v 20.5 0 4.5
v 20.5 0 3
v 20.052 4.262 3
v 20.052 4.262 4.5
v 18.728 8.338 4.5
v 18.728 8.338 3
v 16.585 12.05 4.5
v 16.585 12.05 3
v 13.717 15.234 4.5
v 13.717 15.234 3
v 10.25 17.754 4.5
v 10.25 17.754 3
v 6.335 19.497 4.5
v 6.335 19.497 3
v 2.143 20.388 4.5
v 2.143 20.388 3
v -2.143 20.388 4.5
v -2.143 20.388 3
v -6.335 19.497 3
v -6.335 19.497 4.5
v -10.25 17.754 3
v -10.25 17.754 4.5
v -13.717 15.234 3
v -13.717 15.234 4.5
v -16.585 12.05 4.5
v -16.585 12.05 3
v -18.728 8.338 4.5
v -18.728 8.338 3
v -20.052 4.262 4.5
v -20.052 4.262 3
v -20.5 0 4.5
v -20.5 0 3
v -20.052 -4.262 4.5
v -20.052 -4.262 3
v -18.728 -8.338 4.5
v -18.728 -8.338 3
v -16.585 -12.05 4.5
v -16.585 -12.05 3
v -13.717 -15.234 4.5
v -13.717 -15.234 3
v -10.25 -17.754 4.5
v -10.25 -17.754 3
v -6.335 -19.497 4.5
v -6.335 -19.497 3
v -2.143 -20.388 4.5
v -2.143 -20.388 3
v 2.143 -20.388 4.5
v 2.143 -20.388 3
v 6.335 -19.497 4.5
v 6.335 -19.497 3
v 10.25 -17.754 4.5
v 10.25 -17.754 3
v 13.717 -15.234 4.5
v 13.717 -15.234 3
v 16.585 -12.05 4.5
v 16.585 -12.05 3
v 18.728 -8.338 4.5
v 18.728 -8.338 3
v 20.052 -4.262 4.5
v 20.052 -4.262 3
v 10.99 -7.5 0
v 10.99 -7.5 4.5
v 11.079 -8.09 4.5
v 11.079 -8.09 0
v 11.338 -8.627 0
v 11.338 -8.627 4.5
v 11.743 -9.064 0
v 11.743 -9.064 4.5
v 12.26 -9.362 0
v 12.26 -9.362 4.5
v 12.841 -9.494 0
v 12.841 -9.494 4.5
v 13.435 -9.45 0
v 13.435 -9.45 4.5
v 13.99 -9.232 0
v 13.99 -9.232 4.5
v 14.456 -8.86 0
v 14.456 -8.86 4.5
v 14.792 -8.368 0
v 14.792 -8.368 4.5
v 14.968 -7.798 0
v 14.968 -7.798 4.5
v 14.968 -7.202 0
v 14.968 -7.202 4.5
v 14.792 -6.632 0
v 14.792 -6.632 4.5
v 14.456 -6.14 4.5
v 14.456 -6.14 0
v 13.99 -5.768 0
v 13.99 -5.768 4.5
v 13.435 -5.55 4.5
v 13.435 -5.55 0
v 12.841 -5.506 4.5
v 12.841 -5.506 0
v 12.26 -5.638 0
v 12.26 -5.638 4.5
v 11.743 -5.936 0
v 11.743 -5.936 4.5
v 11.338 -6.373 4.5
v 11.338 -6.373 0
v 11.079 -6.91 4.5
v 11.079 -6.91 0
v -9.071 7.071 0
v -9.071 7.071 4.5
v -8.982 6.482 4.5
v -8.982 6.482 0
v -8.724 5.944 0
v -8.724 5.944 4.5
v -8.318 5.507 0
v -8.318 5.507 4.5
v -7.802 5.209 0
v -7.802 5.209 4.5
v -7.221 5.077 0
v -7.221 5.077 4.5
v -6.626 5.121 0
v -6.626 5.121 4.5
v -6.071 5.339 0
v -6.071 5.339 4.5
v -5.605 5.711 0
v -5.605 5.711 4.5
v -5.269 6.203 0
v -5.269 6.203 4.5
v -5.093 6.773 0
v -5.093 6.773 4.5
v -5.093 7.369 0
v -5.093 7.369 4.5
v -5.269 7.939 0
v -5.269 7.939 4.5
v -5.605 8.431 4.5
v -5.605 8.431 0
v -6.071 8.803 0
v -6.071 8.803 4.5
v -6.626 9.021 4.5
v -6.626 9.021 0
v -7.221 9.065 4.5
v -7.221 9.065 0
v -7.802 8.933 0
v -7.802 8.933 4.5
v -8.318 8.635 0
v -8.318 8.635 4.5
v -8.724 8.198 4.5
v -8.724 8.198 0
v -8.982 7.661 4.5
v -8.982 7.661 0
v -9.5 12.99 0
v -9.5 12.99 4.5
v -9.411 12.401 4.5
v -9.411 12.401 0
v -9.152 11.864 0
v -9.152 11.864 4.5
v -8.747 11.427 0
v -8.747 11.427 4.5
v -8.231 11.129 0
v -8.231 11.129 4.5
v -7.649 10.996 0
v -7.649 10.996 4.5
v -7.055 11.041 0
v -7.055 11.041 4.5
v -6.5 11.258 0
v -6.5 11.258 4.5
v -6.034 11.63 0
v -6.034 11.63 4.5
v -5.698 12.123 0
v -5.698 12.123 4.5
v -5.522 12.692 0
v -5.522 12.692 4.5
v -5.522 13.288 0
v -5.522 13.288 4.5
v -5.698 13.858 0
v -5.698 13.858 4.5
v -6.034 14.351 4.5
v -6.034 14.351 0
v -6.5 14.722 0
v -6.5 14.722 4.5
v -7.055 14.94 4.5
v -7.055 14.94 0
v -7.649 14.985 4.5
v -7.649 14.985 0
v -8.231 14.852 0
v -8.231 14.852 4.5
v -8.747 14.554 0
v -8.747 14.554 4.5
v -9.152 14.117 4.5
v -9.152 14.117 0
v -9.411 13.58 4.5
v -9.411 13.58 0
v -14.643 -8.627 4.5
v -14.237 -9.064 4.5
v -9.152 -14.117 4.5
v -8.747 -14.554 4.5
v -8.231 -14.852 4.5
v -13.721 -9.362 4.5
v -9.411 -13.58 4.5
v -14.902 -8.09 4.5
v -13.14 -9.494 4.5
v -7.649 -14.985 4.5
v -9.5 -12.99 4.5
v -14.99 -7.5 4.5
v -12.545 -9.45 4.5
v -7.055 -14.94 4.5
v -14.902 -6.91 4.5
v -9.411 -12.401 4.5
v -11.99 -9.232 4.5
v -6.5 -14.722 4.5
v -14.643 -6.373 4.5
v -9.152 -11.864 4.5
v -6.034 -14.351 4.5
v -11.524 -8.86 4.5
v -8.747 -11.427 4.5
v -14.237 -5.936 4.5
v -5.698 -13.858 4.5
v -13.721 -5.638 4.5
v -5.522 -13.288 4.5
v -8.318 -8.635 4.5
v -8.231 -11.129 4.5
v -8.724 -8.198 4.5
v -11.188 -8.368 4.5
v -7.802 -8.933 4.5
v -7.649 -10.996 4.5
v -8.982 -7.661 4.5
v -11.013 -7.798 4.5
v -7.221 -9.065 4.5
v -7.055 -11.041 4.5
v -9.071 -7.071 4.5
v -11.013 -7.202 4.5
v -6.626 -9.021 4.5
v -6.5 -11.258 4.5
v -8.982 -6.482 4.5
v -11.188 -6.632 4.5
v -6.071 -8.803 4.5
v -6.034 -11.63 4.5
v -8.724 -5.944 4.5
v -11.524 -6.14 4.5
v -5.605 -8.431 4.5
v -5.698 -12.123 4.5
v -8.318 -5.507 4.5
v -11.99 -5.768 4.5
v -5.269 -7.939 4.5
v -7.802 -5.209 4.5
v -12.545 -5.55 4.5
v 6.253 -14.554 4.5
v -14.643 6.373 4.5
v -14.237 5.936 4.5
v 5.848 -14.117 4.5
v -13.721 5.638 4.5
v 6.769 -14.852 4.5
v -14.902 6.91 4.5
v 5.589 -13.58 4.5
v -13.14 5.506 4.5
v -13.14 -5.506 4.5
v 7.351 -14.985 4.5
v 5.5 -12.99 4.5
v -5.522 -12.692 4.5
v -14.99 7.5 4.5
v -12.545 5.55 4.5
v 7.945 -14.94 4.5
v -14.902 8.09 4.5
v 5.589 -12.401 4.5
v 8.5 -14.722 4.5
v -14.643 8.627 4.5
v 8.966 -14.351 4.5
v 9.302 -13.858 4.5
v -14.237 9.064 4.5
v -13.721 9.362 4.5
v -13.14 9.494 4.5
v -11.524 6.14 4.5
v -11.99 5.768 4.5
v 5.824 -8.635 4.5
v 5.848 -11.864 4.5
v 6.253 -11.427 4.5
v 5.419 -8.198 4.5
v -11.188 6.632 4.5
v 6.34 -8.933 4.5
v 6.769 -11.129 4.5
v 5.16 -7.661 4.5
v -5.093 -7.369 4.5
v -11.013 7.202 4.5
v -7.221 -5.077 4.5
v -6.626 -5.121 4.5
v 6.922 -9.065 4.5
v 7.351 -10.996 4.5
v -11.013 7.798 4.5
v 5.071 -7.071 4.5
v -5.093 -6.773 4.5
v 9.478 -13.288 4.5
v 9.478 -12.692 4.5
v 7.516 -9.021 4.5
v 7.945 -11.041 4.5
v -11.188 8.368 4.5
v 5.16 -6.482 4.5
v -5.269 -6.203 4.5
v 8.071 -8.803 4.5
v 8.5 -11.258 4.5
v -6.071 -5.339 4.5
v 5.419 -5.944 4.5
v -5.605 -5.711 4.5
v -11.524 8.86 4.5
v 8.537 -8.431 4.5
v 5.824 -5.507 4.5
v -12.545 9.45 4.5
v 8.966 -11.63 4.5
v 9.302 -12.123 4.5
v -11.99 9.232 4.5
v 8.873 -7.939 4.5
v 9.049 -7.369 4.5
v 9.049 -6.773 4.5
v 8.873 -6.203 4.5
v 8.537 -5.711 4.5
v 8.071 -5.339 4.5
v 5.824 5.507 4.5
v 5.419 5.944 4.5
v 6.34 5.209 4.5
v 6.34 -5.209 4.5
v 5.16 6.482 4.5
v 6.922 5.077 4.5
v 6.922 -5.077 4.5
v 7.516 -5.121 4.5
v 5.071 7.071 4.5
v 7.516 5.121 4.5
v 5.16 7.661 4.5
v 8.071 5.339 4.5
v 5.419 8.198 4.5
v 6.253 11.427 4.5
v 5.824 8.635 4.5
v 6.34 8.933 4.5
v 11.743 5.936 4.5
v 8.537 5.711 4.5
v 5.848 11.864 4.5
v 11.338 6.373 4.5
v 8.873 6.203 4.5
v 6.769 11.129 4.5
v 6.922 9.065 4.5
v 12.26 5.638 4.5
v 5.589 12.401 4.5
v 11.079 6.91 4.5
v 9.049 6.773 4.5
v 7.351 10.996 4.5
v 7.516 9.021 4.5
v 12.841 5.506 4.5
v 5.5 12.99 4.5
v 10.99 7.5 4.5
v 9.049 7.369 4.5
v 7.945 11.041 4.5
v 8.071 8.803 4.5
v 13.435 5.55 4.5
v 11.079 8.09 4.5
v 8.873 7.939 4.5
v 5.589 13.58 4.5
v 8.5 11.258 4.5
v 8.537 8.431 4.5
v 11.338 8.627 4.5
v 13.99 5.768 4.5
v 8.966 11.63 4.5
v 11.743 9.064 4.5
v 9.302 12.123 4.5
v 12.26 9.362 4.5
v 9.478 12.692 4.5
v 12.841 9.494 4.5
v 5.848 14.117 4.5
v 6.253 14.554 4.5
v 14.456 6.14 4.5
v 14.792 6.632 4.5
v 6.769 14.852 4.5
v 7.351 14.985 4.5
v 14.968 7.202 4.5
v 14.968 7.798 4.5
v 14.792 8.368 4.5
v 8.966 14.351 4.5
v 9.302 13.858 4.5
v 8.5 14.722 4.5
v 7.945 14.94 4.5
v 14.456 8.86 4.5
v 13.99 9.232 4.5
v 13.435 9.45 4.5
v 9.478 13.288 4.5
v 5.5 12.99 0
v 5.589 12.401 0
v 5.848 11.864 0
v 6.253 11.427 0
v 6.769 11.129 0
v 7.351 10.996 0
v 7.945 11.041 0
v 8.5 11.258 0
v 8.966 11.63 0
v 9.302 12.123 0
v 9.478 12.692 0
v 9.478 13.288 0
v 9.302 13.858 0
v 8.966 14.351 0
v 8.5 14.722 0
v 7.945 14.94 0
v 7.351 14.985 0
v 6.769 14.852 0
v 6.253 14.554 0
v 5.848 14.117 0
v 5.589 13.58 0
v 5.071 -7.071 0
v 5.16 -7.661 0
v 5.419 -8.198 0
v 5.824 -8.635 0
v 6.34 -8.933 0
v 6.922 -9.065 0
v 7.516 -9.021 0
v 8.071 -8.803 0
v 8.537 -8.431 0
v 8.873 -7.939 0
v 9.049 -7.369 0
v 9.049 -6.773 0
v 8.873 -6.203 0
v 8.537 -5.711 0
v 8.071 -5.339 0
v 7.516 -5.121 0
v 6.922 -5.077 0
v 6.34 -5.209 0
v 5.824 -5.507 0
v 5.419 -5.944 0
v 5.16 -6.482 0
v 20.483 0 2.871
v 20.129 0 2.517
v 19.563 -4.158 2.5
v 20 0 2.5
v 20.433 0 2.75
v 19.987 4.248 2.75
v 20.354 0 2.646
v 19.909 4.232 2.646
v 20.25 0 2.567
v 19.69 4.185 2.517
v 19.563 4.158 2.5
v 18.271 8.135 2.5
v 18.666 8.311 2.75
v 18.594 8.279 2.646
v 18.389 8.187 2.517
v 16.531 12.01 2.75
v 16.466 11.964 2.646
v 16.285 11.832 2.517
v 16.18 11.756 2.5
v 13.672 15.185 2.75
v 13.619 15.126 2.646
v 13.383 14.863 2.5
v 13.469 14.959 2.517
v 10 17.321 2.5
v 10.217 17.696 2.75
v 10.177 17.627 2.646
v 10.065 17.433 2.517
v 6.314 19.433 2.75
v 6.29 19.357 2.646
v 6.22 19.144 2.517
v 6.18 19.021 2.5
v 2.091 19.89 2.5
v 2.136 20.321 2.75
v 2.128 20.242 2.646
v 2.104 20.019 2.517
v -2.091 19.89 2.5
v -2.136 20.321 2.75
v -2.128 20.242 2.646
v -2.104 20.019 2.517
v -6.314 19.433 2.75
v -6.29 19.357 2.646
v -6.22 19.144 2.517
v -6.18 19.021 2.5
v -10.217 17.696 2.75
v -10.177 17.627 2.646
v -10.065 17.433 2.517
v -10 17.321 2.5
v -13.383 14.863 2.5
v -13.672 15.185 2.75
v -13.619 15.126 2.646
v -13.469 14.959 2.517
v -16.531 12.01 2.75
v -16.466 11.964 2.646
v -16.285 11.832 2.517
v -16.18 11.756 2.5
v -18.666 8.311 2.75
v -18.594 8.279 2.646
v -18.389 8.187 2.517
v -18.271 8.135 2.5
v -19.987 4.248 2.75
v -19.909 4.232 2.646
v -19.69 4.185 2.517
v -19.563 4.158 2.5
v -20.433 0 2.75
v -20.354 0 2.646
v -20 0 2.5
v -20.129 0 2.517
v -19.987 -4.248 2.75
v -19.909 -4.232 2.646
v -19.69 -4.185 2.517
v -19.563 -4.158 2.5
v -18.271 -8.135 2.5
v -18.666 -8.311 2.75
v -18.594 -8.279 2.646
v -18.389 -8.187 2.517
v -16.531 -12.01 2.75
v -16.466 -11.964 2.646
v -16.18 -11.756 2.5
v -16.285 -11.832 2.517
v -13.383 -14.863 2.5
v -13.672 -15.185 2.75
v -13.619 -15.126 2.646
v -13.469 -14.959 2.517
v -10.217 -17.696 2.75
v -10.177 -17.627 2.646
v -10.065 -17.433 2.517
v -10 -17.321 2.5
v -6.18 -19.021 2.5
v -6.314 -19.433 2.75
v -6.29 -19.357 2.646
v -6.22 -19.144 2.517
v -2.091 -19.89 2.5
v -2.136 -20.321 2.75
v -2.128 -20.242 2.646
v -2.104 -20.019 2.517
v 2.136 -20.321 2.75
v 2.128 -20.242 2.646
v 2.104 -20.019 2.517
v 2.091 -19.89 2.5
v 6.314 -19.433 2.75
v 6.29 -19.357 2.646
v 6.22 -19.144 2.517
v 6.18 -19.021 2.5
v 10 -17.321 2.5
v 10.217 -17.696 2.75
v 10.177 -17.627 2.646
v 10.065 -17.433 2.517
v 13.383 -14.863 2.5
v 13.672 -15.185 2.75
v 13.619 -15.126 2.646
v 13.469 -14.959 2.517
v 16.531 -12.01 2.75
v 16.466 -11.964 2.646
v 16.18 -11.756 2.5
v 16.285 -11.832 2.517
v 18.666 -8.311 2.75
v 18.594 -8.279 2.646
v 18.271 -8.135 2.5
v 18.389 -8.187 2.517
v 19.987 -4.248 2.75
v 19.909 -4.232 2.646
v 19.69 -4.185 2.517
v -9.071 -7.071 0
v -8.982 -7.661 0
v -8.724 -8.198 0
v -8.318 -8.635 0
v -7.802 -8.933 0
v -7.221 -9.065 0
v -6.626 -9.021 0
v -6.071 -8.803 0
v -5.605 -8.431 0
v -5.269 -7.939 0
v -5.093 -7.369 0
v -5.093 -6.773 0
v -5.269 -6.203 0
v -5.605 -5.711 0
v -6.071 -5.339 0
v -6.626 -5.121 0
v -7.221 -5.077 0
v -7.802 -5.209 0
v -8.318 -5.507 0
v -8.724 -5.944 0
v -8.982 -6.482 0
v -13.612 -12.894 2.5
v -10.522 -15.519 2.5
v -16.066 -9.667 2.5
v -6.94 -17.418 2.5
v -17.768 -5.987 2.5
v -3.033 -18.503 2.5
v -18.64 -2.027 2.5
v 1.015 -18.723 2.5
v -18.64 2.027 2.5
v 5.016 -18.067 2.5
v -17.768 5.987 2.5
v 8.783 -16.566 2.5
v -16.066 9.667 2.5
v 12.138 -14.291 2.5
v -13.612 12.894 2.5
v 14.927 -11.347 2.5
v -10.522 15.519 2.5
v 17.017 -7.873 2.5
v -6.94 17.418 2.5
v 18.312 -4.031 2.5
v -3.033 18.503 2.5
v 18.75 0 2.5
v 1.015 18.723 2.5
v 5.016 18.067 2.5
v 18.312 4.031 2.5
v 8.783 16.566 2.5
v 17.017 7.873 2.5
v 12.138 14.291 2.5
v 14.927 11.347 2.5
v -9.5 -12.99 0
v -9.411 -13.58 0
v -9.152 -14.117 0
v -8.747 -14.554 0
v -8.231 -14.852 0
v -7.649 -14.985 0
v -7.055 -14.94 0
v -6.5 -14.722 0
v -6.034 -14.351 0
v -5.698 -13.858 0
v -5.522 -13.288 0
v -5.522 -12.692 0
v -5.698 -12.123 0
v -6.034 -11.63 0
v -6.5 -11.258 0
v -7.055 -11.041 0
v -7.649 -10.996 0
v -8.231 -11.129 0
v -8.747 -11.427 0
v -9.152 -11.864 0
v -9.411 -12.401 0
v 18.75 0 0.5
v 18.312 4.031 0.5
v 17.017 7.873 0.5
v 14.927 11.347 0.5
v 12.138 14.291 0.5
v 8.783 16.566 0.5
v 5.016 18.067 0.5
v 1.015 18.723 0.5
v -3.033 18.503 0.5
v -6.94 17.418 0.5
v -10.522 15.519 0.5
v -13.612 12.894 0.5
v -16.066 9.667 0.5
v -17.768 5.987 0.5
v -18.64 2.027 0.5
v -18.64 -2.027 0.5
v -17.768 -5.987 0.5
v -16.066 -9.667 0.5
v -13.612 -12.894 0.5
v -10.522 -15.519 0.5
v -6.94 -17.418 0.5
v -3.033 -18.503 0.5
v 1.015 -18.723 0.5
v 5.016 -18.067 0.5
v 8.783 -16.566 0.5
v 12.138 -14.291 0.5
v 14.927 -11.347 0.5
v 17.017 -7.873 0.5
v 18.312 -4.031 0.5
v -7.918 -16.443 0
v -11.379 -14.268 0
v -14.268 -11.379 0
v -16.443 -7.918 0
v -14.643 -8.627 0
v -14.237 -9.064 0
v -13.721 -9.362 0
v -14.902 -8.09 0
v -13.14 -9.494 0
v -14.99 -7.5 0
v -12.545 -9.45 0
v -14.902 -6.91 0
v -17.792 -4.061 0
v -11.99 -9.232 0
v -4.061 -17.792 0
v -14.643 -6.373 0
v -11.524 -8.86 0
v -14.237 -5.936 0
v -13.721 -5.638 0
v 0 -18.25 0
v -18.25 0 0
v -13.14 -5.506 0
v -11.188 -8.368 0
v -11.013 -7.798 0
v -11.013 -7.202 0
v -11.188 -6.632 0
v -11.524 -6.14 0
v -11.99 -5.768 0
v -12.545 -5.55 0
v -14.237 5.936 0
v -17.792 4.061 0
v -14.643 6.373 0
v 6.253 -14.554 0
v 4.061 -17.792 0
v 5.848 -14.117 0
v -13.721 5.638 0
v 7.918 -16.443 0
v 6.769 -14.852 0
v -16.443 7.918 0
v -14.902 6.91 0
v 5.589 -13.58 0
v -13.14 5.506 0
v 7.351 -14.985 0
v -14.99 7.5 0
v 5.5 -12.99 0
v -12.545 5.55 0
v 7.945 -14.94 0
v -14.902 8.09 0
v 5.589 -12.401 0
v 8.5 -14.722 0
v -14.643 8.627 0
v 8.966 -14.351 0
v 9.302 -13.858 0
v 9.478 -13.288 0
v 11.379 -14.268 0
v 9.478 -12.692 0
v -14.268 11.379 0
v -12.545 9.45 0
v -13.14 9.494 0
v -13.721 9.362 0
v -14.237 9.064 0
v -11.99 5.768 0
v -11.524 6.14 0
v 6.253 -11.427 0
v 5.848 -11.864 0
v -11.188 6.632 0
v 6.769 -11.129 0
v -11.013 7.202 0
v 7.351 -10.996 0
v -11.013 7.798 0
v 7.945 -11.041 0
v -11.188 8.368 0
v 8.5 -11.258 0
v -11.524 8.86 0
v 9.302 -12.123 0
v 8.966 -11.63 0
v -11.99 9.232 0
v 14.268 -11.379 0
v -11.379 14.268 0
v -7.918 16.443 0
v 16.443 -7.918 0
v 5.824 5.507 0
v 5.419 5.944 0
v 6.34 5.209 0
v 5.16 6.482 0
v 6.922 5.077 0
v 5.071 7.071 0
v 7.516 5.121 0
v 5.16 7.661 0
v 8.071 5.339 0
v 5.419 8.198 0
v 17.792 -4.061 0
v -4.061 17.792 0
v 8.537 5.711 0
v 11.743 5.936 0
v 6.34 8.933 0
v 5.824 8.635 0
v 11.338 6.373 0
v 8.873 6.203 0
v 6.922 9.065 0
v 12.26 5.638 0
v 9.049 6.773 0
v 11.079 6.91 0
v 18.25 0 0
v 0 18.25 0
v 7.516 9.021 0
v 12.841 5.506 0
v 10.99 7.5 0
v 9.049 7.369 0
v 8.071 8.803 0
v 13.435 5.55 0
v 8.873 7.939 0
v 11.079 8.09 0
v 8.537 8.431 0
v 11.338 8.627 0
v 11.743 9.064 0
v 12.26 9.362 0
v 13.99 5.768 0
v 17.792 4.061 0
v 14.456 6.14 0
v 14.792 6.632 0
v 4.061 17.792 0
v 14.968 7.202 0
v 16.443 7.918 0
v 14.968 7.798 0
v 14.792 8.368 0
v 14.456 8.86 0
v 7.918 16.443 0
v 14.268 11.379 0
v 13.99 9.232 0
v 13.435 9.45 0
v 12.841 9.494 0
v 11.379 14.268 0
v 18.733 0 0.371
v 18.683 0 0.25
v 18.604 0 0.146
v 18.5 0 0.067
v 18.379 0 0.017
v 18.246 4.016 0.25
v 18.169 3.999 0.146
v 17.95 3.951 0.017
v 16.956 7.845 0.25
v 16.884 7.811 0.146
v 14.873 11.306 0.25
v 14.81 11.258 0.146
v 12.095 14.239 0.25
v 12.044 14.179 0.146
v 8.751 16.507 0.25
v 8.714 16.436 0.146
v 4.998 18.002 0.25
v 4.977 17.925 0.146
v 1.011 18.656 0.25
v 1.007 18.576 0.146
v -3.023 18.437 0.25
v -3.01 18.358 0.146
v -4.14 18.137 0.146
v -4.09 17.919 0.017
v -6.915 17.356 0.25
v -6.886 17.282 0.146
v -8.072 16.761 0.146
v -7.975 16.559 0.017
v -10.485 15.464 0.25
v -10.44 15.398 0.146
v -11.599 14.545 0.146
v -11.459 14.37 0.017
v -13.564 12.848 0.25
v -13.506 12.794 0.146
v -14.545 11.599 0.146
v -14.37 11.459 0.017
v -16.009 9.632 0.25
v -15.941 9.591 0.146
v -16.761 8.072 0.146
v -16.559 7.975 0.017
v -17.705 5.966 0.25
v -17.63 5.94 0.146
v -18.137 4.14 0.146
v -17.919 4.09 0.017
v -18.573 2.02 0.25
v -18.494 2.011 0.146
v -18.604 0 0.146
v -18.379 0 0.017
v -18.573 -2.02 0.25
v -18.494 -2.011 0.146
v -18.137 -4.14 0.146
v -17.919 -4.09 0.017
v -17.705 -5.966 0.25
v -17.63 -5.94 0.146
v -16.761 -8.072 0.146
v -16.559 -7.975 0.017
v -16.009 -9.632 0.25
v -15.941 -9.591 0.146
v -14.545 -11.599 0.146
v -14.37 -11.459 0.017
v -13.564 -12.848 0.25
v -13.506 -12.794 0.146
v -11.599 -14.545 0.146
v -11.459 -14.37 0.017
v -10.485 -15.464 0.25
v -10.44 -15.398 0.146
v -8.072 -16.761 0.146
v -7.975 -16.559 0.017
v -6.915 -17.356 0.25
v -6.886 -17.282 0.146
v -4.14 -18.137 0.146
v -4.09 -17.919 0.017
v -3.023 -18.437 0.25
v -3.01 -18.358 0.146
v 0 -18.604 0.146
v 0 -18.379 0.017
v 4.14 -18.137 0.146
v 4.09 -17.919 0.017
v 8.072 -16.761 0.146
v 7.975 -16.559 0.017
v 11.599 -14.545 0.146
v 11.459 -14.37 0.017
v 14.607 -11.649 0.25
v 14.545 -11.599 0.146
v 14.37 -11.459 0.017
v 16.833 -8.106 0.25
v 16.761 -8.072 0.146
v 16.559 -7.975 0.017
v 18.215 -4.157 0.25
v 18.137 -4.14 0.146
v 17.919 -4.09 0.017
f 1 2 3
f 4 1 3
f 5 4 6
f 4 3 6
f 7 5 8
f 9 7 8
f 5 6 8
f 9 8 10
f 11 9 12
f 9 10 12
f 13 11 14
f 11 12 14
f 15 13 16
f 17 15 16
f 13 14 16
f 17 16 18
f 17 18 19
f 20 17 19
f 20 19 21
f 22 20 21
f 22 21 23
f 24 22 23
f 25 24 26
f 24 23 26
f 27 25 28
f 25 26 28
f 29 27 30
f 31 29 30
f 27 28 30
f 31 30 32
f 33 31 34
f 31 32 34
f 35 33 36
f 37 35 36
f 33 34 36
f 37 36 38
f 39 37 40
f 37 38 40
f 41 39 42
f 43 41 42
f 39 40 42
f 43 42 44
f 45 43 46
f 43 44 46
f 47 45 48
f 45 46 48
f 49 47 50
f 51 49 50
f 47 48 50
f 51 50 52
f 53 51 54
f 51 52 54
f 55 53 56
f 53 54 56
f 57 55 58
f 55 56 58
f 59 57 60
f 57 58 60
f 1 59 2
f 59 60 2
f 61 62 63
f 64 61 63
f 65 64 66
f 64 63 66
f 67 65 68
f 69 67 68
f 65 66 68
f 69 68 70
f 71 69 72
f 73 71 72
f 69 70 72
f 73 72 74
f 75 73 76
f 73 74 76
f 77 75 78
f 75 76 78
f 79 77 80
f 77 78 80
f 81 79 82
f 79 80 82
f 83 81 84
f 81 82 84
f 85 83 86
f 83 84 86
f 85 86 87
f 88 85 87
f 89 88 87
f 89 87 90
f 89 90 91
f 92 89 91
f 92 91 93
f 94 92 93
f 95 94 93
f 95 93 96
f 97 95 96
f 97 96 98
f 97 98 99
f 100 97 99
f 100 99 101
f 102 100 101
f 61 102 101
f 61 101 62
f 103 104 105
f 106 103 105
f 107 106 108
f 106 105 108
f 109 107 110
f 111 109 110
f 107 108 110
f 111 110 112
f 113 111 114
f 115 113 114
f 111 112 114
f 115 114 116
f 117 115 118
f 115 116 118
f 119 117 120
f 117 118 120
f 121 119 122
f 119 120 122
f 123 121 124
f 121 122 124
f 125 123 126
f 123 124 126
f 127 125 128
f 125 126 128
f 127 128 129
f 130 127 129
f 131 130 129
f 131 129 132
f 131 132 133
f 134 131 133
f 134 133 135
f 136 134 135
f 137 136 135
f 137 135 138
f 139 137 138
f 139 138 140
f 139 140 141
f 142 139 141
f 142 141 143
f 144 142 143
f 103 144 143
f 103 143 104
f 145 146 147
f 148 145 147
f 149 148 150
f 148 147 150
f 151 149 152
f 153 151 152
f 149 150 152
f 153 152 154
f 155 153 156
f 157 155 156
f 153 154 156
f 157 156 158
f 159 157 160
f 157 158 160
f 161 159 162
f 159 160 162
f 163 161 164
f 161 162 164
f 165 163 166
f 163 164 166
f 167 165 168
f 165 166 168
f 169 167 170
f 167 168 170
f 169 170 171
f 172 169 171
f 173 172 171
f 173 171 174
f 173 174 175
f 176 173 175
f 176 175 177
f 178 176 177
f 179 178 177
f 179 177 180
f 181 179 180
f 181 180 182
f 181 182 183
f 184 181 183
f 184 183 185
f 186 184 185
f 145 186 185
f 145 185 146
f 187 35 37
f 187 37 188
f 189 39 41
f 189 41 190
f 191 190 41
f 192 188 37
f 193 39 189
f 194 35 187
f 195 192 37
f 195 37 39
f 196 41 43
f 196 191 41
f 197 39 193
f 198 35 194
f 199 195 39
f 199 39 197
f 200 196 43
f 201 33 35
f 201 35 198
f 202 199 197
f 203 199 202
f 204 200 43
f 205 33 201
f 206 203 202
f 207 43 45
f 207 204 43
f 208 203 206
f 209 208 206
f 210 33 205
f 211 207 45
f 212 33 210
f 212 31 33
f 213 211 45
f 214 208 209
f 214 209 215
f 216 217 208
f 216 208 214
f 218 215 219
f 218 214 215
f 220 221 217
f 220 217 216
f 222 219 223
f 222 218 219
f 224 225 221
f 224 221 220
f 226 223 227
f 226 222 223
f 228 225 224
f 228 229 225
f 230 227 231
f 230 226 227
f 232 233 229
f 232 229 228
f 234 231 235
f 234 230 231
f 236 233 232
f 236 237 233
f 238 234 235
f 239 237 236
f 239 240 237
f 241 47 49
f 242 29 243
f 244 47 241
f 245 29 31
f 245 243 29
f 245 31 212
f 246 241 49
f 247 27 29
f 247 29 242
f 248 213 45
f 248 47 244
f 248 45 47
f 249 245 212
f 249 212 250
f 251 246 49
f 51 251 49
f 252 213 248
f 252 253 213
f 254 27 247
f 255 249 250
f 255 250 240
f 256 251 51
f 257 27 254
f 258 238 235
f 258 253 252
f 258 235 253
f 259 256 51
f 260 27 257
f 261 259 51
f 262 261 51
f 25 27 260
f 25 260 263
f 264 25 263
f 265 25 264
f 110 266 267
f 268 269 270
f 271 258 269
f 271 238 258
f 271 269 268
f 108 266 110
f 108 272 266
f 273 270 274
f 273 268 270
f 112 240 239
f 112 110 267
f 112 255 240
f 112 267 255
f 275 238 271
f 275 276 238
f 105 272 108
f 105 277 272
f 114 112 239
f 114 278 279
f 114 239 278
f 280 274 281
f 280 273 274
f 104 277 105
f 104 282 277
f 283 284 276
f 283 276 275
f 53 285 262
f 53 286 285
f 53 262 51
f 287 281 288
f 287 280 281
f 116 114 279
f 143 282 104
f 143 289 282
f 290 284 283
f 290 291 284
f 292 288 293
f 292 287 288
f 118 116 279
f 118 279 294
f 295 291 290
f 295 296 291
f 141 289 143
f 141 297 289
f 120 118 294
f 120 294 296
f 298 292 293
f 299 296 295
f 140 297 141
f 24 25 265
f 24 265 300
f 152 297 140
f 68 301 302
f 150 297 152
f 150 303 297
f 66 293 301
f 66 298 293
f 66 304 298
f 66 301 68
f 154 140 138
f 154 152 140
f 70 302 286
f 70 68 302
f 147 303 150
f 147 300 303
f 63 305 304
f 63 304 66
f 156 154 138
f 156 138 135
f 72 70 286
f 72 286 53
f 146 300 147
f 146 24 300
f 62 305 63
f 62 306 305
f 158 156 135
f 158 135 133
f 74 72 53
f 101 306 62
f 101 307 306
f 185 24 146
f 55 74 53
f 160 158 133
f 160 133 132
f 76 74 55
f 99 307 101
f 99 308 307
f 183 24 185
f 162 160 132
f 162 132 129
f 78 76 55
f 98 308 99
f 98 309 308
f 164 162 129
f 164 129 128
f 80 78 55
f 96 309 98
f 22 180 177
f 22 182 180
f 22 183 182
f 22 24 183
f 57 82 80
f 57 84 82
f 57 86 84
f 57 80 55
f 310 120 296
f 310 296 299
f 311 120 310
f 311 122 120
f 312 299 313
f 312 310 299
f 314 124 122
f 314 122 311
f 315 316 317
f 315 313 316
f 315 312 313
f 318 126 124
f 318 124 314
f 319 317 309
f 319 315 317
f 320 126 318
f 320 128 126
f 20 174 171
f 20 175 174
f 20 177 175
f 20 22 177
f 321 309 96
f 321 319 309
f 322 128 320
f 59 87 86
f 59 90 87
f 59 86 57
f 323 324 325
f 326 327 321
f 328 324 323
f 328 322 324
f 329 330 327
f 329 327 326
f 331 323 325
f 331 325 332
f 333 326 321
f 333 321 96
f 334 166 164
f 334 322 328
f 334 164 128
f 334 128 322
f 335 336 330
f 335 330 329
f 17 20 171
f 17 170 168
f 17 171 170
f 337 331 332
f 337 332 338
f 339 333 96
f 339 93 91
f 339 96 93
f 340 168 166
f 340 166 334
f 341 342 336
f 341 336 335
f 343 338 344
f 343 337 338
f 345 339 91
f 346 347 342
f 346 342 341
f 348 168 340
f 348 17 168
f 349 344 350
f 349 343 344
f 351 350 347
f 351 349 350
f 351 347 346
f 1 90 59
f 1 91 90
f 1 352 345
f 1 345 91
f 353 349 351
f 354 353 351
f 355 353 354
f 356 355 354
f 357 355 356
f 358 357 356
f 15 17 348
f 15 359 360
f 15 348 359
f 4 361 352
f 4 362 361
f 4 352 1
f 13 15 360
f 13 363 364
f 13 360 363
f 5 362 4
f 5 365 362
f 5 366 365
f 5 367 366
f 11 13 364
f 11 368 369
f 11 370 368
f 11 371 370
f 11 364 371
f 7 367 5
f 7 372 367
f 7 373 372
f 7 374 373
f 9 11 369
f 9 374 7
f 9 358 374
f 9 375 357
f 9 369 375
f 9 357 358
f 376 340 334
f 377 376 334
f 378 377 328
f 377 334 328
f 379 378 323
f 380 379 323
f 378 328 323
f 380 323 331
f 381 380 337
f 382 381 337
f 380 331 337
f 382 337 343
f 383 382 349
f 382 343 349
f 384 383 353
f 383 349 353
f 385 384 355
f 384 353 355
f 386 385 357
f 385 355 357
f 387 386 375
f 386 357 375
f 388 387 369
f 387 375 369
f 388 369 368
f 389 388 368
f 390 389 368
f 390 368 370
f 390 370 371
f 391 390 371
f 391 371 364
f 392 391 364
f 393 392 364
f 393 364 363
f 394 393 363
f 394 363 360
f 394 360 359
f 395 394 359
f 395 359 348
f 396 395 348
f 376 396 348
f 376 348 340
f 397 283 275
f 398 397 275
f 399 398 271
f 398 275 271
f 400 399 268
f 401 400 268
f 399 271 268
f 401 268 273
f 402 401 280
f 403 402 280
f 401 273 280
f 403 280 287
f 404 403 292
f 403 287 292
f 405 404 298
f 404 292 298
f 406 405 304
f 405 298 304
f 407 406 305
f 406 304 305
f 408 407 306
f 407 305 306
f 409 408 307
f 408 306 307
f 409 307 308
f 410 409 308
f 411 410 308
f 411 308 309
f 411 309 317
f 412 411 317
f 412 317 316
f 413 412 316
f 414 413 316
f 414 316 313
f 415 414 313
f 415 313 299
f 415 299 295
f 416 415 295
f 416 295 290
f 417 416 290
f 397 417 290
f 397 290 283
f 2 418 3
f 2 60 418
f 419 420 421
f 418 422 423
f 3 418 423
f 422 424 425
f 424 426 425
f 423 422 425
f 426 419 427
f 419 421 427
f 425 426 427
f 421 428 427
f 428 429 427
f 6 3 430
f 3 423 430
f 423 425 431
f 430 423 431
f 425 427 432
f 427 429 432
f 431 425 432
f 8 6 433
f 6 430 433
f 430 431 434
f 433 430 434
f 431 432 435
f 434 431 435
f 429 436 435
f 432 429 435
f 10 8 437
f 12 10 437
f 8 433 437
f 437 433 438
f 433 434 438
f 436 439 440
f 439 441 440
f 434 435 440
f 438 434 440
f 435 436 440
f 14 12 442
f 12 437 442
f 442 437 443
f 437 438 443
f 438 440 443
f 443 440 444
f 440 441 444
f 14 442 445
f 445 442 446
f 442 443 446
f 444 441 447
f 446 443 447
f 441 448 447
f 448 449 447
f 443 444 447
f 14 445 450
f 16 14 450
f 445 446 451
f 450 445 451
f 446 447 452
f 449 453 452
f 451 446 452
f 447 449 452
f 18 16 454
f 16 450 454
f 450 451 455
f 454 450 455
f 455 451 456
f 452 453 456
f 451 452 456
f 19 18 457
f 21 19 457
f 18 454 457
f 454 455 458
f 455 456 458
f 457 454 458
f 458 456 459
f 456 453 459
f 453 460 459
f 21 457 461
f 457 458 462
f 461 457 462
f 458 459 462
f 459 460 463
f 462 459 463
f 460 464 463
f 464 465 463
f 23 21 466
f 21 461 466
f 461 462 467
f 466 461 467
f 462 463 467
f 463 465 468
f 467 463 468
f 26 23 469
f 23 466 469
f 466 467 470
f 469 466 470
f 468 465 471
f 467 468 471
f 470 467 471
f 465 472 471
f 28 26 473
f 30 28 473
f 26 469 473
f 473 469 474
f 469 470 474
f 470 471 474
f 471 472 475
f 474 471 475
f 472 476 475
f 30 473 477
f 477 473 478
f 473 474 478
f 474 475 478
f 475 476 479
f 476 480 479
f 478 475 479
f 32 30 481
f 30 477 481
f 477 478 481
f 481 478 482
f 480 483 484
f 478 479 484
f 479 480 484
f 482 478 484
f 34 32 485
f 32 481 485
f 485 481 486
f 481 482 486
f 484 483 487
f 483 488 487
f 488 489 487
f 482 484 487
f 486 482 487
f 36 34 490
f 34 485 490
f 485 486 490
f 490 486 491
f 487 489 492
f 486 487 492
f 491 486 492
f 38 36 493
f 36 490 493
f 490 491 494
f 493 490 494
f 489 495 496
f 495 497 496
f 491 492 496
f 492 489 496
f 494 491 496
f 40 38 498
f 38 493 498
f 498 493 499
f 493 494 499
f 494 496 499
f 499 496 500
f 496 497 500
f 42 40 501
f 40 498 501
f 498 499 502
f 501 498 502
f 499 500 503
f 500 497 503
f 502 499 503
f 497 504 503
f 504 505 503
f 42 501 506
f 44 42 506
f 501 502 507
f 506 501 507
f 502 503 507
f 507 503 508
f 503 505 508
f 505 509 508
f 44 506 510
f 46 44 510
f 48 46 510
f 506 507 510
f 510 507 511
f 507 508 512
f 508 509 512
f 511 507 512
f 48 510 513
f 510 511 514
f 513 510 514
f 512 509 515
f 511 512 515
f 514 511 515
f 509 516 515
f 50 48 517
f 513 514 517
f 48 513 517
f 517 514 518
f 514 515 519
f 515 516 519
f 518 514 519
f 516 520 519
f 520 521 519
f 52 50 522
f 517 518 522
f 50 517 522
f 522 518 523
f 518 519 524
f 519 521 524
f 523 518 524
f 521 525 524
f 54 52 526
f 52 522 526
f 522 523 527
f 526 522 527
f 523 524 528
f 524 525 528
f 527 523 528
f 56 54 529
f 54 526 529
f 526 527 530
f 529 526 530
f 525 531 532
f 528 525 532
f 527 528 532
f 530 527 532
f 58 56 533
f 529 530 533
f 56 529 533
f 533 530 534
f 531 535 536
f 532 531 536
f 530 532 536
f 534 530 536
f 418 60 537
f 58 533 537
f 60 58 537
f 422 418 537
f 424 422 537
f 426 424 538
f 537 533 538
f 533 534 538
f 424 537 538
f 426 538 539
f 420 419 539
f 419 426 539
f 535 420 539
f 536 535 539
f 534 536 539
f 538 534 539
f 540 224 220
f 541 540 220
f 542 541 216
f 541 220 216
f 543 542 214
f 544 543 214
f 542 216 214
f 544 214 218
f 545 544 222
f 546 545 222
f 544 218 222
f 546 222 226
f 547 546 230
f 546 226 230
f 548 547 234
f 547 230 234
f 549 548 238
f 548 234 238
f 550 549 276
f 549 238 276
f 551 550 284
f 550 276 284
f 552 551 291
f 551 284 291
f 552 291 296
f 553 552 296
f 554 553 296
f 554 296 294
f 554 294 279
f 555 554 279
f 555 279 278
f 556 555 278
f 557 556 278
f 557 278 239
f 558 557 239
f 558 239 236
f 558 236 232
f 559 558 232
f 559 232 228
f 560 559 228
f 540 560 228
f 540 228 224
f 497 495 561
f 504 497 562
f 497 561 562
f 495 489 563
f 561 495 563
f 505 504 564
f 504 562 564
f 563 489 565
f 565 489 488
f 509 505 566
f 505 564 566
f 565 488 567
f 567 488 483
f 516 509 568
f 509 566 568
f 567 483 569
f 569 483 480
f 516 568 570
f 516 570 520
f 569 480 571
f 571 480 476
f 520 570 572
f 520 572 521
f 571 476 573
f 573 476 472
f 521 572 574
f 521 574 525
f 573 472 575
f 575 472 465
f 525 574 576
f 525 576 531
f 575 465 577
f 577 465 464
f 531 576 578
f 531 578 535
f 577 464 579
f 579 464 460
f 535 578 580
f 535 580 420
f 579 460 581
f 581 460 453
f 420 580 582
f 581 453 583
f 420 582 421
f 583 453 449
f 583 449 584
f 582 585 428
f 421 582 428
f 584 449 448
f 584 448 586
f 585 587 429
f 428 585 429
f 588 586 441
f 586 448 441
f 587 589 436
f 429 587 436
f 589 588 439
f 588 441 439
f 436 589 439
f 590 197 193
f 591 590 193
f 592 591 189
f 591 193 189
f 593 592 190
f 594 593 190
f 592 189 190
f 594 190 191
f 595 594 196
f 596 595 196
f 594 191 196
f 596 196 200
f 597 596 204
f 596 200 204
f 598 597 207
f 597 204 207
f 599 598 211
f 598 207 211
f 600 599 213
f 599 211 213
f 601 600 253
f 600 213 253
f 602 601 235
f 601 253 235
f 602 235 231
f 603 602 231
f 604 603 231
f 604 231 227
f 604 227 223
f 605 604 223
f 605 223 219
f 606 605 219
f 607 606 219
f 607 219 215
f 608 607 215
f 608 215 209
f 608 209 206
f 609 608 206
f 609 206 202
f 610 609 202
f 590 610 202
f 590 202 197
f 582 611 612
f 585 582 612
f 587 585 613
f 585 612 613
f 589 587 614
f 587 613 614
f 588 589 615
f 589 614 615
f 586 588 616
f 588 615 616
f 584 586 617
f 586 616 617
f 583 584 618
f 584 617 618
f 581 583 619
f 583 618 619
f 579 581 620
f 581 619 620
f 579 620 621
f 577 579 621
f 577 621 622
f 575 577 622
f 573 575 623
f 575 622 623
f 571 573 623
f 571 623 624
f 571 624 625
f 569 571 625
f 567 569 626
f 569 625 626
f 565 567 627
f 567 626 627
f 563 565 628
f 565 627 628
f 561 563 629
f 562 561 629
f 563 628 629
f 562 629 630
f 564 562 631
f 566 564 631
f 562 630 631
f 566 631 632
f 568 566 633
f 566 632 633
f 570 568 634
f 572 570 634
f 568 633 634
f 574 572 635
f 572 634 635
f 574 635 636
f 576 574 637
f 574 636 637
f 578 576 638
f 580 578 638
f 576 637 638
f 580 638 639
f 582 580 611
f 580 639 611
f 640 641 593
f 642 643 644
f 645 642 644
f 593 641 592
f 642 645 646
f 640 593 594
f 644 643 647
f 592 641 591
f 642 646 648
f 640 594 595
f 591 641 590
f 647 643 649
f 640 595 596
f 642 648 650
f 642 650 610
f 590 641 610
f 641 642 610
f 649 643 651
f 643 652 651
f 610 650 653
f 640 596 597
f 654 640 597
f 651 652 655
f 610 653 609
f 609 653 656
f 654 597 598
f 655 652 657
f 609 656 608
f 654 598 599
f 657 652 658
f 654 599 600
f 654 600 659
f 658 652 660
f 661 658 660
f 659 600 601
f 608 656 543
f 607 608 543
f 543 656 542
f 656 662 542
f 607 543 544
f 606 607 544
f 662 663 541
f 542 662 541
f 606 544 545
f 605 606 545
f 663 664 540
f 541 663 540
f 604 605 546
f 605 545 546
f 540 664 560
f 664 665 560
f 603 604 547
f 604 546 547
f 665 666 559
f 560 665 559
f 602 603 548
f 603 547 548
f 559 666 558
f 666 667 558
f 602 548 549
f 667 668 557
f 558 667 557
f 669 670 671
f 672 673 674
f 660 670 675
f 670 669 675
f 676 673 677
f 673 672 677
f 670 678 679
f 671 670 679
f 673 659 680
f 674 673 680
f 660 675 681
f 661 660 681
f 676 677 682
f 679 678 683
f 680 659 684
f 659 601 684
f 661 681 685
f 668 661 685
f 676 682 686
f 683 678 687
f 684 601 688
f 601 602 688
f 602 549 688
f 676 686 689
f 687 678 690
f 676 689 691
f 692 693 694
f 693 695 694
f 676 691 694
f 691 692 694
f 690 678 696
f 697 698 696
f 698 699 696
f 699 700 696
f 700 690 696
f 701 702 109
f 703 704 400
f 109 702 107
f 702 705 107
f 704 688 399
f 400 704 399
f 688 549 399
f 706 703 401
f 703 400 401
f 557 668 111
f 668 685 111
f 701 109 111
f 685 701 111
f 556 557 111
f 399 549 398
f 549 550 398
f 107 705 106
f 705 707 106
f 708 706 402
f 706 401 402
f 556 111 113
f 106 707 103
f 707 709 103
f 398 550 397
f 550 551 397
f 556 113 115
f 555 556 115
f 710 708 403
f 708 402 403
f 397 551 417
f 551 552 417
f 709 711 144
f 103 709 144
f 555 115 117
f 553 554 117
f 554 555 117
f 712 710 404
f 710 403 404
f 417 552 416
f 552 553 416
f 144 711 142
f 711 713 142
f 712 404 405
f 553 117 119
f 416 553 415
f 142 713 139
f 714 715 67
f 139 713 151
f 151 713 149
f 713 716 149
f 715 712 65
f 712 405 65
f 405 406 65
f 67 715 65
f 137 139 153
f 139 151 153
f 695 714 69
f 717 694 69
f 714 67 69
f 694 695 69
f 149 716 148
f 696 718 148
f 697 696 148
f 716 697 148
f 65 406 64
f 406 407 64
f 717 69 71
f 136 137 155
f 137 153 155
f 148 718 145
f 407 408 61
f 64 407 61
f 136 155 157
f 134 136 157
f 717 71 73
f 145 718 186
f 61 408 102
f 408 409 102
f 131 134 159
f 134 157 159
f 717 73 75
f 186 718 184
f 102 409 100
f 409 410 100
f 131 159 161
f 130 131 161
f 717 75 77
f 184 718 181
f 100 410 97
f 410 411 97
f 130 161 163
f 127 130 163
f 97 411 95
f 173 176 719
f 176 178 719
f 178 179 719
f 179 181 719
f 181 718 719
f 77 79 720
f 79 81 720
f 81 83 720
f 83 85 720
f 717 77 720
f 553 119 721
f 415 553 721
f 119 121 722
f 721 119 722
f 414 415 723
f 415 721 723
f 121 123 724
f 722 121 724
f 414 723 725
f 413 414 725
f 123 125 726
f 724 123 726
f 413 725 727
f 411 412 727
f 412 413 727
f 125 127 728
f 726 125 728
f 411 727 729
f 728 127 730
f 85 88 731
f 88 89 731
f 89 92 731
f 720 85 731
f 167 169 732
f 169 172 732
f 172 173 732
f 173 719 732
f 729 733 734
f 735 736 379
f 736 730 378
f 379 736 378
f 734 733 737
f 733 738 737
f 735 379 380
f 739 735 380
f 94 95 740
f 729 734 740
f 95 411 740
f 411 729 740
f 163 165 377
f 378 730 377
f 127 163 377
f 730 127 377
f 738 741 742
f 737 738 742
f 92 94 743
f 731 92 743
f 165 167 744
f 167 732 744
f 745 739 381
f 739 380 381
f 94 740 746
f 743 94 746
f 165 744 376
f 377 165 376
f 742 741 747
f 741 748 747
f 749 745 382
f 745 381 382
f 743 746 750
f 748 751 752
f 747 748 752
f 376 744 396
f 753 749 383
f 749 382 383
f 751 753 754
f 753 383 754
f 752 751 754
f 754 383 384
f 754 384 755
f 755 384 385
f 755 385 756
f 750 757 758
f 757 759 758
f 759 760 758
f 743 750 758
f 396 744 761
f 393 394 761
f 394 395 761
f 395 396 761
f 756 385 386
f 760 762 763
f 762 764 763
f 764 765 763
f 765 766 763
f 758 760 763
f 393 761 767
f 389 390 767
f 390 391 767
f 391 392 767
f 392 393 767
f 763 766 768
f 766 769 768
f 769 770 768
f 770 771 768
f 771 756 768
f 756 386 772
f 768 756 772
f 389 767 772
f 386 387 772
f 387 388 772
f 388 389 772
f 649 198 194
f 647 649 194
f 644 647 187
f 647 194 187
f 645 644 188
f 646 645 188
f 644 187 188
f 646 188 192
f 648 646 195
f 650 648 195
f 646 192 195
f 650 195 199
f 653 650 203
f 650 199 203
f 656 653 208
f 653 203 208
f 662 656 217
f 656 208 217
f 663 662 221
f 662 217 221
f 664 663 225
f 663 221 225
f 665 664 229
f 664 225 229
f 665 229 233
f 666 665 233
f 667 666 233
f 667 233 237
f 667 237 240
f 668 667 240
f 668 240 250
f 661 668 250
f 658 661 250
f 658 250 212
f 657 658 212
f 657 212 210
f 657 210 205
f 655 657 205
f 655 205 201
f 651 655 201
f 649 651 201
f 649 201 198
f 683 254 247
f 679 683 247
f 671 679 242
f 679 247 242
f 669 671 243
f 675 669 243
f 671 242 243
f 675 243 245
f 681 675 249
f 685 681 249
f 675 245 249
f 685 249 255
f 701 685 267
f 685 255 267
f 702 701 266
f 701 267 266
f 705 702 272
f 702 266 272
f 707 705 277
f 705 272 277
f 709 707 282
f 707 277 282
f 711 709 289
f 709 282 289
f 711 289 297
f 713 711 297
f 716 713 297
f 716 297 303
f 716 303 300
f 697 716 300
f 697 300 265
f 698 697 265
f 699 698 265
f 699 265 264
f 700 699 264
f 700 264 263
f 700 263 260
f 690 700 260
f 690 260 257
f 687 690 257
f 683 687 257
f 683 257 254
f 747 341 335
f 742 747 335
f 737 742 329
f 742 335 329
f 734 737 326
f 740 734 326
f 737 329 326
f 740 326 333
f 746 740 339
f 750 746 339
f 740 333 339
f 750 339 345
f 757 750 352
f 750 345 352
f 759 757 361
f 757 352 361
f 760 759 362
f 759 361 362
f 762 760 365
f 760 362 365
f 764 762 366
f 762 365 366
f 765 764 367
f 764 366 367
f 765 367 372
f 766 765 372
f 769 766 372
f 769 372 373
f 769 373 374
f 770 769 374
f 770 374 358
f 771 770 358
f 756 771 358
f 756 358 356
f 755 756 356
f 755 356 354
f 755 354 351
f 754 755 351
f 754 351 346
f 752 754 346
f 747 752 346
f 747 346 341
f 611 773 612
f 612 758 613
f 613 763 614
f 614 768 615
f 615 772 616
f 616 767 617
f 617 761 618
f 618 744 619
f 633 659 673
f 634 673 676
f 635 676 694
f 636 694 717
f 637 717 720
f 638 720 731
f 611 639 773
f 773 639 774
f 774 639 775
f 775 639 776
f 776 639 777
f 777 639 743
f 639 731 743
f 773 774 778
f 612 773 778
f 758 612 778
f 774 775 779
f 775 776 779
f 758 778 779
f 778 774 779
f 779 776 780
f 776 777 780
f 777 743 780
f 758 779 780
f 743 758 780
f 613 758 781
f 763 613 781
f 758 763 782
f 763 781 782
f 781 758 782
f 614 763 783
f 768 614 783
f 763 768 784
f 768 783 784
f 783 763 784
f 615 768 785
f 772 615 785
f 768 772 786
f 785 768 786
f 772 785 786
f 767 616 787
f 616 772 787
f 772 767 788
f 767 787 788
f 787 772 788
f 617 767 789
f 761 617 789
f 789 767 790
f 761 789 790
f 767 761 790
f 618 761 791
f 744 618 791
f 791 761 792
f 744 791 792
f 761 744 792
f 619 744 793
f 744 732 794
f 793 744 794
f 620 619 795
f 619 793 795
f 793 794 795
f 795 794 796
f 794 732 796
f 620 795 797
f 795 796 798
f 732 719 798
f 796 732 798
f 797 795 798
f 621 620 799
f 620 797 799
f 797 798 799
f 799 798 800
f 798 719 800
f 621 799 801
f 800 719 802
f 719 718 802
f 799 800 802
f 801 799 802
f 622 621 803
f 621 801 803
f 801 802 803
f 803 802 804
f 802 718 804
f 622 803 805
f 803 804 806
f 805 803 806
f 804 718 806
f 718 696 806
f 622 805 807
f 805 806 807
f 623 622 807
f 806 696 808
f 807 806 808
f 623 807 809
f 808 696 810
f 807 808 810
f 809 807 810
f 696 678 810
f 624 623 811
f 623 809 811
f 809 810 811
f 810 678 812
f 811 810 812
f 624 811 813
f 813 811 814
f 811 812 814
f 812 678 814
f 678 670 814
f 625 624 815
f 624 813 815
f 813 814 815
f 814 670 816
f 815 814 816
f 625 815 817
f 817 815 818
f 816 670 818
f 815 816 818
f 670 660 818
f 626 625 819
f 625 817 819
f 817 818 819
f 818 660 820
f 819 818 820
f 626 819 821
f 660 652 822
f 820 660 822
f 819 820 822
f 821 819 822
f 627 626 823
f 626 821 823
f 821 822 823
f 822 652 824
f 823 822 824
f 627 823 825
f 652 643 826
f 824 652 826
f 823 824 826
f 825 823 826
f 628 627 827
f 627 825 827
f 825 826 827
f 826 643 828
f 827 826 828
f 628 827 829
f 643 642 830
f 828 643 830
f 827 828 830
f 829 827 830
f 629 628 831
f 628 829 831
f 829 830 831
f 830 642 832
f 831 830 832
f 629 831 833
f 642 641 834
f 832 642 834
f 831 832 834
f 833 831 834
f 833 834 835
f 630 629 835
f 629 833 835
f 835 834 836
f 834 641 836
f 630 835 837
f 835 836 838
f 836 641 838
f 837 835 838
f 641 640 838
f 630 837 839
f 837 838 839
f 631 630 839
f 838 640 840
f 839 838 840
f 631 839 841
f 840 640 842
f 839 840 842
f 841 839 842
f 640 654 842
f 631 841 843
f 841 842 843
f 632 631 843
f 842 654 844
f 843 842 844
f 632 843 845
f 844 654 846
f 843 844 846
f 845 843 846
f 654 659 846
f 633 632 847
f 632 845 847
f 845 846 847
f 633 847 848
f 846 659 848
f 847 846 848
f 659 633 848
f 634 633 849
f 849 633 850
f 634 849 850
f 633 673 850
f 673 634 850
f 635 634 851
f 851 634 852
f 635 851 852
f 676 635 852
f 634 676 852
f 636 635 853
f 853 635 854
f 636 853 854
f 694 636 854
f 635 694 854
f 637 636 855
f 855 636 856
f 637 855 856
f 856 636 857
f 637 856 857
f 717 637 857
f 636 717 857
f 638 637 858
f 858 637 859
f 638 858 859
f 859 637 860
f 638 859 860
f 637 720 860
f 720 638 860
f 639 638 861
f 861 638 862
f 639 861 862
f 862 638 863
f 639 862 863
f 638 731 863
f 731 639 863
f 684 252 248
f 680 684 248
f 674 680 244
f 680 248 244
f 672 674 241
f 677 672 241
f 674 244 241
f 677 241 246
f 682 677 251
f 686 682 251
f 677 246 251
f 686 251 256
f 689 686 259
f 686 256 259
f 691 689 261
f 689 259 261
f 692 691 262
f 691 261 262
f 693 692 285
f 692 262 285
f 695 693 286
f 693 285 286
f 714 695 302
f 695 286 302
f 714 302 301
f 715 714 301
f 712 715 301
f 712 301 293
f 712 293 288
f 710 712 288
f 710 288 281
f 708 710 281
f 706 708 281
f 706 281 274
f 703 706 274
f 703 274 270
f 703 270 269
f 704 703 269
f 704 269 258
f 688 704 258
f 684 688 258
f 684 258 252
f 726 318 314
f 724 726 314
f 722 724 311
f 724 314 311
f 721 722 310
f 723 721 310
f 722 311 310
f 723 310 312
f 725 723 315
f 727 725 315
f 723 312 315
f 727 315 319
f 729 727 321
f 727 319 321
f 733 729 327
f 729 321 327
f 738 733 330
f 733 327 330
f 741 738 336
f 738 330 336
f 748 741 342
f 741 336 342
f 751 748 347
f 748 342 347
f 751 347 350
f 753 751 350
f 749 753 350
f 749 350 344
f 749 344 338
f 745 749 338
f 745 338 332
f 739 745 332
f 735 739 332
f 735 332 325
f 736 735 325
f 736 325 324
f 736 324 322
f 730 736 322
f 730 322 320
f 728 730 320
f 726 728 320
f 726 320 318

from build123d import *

# Parameters (mm, degrees)
F0_R     = 18.75
F1_DEPTH = 2.5
F3_R     = 0.5
F4_R     = 20.5
F5_DEPTH = 2
F6_D     = 4
F7_D     = 4
F8_R     = 0.5


with BuildPart() as f1:
    # F0 (on Top) → F1 (new body)
    with BuildSketch(Plane.XY):
        Circle(F0_R)
    extrude(amount=F1_DEPTH)

    # F3
    f3_edges = [f1.edges().sort_by_distance(p)[0] for p in [
        (-18.75, 0, 0),
    ]]
    fillet(f3_edges, radius=F3_R)

    # F4 (on face) → F5 (join)
    with BuildSketch(Plane.XY.offset(2.5)):
        Circle(F4_R)
    extrude(amount=F5_DEPTH)

    # F6 (through all)
    with Locations(Plane(origin=(0, 0, 2.5), x_dir=(1, 0, 0), z_dir=(0, 0, -1))):
        with Locations((-7.5, -12.990381), (-12.990381, -7.5), (-7.071068, -7.071068), (-12.990381, 7.5), (-7.071068, 7.071068), (-7.5, 12.990381), (7.5, 12.990381), (7.071068, 7.071068), (12.990381, 7.5), (7.071068, -7.071068), (7.5, -12.990381), (12.990381, -7.5)):
            Hole(F6_D / 2)

    # F7 (through all)
    with Locations(Plane.XY.offset(2.5)):
        with Locations((-12.990381, 7.5), (-7.5, 12.990381), (-7.071068, 7.071068), (-12.990381, -7.5), (-7.071068, -7.071068), (-7.5, -12.990381), (7.5, -12.990381), (7.071068, -7.071068), (12.990381, -7.5), (7.071068, 7.071068), (12.990381, 7.5), (7.5, 12.990381)):
            Hole(F7_D / 2)

    # F8
    f8_edges = [f1.edges().sort_by_distance(p)[0] for p in [
        (-20.5, 0, 2.5),
    ]]
    fillet(f8_edges, radius=F8_R)


solid = f1.part
